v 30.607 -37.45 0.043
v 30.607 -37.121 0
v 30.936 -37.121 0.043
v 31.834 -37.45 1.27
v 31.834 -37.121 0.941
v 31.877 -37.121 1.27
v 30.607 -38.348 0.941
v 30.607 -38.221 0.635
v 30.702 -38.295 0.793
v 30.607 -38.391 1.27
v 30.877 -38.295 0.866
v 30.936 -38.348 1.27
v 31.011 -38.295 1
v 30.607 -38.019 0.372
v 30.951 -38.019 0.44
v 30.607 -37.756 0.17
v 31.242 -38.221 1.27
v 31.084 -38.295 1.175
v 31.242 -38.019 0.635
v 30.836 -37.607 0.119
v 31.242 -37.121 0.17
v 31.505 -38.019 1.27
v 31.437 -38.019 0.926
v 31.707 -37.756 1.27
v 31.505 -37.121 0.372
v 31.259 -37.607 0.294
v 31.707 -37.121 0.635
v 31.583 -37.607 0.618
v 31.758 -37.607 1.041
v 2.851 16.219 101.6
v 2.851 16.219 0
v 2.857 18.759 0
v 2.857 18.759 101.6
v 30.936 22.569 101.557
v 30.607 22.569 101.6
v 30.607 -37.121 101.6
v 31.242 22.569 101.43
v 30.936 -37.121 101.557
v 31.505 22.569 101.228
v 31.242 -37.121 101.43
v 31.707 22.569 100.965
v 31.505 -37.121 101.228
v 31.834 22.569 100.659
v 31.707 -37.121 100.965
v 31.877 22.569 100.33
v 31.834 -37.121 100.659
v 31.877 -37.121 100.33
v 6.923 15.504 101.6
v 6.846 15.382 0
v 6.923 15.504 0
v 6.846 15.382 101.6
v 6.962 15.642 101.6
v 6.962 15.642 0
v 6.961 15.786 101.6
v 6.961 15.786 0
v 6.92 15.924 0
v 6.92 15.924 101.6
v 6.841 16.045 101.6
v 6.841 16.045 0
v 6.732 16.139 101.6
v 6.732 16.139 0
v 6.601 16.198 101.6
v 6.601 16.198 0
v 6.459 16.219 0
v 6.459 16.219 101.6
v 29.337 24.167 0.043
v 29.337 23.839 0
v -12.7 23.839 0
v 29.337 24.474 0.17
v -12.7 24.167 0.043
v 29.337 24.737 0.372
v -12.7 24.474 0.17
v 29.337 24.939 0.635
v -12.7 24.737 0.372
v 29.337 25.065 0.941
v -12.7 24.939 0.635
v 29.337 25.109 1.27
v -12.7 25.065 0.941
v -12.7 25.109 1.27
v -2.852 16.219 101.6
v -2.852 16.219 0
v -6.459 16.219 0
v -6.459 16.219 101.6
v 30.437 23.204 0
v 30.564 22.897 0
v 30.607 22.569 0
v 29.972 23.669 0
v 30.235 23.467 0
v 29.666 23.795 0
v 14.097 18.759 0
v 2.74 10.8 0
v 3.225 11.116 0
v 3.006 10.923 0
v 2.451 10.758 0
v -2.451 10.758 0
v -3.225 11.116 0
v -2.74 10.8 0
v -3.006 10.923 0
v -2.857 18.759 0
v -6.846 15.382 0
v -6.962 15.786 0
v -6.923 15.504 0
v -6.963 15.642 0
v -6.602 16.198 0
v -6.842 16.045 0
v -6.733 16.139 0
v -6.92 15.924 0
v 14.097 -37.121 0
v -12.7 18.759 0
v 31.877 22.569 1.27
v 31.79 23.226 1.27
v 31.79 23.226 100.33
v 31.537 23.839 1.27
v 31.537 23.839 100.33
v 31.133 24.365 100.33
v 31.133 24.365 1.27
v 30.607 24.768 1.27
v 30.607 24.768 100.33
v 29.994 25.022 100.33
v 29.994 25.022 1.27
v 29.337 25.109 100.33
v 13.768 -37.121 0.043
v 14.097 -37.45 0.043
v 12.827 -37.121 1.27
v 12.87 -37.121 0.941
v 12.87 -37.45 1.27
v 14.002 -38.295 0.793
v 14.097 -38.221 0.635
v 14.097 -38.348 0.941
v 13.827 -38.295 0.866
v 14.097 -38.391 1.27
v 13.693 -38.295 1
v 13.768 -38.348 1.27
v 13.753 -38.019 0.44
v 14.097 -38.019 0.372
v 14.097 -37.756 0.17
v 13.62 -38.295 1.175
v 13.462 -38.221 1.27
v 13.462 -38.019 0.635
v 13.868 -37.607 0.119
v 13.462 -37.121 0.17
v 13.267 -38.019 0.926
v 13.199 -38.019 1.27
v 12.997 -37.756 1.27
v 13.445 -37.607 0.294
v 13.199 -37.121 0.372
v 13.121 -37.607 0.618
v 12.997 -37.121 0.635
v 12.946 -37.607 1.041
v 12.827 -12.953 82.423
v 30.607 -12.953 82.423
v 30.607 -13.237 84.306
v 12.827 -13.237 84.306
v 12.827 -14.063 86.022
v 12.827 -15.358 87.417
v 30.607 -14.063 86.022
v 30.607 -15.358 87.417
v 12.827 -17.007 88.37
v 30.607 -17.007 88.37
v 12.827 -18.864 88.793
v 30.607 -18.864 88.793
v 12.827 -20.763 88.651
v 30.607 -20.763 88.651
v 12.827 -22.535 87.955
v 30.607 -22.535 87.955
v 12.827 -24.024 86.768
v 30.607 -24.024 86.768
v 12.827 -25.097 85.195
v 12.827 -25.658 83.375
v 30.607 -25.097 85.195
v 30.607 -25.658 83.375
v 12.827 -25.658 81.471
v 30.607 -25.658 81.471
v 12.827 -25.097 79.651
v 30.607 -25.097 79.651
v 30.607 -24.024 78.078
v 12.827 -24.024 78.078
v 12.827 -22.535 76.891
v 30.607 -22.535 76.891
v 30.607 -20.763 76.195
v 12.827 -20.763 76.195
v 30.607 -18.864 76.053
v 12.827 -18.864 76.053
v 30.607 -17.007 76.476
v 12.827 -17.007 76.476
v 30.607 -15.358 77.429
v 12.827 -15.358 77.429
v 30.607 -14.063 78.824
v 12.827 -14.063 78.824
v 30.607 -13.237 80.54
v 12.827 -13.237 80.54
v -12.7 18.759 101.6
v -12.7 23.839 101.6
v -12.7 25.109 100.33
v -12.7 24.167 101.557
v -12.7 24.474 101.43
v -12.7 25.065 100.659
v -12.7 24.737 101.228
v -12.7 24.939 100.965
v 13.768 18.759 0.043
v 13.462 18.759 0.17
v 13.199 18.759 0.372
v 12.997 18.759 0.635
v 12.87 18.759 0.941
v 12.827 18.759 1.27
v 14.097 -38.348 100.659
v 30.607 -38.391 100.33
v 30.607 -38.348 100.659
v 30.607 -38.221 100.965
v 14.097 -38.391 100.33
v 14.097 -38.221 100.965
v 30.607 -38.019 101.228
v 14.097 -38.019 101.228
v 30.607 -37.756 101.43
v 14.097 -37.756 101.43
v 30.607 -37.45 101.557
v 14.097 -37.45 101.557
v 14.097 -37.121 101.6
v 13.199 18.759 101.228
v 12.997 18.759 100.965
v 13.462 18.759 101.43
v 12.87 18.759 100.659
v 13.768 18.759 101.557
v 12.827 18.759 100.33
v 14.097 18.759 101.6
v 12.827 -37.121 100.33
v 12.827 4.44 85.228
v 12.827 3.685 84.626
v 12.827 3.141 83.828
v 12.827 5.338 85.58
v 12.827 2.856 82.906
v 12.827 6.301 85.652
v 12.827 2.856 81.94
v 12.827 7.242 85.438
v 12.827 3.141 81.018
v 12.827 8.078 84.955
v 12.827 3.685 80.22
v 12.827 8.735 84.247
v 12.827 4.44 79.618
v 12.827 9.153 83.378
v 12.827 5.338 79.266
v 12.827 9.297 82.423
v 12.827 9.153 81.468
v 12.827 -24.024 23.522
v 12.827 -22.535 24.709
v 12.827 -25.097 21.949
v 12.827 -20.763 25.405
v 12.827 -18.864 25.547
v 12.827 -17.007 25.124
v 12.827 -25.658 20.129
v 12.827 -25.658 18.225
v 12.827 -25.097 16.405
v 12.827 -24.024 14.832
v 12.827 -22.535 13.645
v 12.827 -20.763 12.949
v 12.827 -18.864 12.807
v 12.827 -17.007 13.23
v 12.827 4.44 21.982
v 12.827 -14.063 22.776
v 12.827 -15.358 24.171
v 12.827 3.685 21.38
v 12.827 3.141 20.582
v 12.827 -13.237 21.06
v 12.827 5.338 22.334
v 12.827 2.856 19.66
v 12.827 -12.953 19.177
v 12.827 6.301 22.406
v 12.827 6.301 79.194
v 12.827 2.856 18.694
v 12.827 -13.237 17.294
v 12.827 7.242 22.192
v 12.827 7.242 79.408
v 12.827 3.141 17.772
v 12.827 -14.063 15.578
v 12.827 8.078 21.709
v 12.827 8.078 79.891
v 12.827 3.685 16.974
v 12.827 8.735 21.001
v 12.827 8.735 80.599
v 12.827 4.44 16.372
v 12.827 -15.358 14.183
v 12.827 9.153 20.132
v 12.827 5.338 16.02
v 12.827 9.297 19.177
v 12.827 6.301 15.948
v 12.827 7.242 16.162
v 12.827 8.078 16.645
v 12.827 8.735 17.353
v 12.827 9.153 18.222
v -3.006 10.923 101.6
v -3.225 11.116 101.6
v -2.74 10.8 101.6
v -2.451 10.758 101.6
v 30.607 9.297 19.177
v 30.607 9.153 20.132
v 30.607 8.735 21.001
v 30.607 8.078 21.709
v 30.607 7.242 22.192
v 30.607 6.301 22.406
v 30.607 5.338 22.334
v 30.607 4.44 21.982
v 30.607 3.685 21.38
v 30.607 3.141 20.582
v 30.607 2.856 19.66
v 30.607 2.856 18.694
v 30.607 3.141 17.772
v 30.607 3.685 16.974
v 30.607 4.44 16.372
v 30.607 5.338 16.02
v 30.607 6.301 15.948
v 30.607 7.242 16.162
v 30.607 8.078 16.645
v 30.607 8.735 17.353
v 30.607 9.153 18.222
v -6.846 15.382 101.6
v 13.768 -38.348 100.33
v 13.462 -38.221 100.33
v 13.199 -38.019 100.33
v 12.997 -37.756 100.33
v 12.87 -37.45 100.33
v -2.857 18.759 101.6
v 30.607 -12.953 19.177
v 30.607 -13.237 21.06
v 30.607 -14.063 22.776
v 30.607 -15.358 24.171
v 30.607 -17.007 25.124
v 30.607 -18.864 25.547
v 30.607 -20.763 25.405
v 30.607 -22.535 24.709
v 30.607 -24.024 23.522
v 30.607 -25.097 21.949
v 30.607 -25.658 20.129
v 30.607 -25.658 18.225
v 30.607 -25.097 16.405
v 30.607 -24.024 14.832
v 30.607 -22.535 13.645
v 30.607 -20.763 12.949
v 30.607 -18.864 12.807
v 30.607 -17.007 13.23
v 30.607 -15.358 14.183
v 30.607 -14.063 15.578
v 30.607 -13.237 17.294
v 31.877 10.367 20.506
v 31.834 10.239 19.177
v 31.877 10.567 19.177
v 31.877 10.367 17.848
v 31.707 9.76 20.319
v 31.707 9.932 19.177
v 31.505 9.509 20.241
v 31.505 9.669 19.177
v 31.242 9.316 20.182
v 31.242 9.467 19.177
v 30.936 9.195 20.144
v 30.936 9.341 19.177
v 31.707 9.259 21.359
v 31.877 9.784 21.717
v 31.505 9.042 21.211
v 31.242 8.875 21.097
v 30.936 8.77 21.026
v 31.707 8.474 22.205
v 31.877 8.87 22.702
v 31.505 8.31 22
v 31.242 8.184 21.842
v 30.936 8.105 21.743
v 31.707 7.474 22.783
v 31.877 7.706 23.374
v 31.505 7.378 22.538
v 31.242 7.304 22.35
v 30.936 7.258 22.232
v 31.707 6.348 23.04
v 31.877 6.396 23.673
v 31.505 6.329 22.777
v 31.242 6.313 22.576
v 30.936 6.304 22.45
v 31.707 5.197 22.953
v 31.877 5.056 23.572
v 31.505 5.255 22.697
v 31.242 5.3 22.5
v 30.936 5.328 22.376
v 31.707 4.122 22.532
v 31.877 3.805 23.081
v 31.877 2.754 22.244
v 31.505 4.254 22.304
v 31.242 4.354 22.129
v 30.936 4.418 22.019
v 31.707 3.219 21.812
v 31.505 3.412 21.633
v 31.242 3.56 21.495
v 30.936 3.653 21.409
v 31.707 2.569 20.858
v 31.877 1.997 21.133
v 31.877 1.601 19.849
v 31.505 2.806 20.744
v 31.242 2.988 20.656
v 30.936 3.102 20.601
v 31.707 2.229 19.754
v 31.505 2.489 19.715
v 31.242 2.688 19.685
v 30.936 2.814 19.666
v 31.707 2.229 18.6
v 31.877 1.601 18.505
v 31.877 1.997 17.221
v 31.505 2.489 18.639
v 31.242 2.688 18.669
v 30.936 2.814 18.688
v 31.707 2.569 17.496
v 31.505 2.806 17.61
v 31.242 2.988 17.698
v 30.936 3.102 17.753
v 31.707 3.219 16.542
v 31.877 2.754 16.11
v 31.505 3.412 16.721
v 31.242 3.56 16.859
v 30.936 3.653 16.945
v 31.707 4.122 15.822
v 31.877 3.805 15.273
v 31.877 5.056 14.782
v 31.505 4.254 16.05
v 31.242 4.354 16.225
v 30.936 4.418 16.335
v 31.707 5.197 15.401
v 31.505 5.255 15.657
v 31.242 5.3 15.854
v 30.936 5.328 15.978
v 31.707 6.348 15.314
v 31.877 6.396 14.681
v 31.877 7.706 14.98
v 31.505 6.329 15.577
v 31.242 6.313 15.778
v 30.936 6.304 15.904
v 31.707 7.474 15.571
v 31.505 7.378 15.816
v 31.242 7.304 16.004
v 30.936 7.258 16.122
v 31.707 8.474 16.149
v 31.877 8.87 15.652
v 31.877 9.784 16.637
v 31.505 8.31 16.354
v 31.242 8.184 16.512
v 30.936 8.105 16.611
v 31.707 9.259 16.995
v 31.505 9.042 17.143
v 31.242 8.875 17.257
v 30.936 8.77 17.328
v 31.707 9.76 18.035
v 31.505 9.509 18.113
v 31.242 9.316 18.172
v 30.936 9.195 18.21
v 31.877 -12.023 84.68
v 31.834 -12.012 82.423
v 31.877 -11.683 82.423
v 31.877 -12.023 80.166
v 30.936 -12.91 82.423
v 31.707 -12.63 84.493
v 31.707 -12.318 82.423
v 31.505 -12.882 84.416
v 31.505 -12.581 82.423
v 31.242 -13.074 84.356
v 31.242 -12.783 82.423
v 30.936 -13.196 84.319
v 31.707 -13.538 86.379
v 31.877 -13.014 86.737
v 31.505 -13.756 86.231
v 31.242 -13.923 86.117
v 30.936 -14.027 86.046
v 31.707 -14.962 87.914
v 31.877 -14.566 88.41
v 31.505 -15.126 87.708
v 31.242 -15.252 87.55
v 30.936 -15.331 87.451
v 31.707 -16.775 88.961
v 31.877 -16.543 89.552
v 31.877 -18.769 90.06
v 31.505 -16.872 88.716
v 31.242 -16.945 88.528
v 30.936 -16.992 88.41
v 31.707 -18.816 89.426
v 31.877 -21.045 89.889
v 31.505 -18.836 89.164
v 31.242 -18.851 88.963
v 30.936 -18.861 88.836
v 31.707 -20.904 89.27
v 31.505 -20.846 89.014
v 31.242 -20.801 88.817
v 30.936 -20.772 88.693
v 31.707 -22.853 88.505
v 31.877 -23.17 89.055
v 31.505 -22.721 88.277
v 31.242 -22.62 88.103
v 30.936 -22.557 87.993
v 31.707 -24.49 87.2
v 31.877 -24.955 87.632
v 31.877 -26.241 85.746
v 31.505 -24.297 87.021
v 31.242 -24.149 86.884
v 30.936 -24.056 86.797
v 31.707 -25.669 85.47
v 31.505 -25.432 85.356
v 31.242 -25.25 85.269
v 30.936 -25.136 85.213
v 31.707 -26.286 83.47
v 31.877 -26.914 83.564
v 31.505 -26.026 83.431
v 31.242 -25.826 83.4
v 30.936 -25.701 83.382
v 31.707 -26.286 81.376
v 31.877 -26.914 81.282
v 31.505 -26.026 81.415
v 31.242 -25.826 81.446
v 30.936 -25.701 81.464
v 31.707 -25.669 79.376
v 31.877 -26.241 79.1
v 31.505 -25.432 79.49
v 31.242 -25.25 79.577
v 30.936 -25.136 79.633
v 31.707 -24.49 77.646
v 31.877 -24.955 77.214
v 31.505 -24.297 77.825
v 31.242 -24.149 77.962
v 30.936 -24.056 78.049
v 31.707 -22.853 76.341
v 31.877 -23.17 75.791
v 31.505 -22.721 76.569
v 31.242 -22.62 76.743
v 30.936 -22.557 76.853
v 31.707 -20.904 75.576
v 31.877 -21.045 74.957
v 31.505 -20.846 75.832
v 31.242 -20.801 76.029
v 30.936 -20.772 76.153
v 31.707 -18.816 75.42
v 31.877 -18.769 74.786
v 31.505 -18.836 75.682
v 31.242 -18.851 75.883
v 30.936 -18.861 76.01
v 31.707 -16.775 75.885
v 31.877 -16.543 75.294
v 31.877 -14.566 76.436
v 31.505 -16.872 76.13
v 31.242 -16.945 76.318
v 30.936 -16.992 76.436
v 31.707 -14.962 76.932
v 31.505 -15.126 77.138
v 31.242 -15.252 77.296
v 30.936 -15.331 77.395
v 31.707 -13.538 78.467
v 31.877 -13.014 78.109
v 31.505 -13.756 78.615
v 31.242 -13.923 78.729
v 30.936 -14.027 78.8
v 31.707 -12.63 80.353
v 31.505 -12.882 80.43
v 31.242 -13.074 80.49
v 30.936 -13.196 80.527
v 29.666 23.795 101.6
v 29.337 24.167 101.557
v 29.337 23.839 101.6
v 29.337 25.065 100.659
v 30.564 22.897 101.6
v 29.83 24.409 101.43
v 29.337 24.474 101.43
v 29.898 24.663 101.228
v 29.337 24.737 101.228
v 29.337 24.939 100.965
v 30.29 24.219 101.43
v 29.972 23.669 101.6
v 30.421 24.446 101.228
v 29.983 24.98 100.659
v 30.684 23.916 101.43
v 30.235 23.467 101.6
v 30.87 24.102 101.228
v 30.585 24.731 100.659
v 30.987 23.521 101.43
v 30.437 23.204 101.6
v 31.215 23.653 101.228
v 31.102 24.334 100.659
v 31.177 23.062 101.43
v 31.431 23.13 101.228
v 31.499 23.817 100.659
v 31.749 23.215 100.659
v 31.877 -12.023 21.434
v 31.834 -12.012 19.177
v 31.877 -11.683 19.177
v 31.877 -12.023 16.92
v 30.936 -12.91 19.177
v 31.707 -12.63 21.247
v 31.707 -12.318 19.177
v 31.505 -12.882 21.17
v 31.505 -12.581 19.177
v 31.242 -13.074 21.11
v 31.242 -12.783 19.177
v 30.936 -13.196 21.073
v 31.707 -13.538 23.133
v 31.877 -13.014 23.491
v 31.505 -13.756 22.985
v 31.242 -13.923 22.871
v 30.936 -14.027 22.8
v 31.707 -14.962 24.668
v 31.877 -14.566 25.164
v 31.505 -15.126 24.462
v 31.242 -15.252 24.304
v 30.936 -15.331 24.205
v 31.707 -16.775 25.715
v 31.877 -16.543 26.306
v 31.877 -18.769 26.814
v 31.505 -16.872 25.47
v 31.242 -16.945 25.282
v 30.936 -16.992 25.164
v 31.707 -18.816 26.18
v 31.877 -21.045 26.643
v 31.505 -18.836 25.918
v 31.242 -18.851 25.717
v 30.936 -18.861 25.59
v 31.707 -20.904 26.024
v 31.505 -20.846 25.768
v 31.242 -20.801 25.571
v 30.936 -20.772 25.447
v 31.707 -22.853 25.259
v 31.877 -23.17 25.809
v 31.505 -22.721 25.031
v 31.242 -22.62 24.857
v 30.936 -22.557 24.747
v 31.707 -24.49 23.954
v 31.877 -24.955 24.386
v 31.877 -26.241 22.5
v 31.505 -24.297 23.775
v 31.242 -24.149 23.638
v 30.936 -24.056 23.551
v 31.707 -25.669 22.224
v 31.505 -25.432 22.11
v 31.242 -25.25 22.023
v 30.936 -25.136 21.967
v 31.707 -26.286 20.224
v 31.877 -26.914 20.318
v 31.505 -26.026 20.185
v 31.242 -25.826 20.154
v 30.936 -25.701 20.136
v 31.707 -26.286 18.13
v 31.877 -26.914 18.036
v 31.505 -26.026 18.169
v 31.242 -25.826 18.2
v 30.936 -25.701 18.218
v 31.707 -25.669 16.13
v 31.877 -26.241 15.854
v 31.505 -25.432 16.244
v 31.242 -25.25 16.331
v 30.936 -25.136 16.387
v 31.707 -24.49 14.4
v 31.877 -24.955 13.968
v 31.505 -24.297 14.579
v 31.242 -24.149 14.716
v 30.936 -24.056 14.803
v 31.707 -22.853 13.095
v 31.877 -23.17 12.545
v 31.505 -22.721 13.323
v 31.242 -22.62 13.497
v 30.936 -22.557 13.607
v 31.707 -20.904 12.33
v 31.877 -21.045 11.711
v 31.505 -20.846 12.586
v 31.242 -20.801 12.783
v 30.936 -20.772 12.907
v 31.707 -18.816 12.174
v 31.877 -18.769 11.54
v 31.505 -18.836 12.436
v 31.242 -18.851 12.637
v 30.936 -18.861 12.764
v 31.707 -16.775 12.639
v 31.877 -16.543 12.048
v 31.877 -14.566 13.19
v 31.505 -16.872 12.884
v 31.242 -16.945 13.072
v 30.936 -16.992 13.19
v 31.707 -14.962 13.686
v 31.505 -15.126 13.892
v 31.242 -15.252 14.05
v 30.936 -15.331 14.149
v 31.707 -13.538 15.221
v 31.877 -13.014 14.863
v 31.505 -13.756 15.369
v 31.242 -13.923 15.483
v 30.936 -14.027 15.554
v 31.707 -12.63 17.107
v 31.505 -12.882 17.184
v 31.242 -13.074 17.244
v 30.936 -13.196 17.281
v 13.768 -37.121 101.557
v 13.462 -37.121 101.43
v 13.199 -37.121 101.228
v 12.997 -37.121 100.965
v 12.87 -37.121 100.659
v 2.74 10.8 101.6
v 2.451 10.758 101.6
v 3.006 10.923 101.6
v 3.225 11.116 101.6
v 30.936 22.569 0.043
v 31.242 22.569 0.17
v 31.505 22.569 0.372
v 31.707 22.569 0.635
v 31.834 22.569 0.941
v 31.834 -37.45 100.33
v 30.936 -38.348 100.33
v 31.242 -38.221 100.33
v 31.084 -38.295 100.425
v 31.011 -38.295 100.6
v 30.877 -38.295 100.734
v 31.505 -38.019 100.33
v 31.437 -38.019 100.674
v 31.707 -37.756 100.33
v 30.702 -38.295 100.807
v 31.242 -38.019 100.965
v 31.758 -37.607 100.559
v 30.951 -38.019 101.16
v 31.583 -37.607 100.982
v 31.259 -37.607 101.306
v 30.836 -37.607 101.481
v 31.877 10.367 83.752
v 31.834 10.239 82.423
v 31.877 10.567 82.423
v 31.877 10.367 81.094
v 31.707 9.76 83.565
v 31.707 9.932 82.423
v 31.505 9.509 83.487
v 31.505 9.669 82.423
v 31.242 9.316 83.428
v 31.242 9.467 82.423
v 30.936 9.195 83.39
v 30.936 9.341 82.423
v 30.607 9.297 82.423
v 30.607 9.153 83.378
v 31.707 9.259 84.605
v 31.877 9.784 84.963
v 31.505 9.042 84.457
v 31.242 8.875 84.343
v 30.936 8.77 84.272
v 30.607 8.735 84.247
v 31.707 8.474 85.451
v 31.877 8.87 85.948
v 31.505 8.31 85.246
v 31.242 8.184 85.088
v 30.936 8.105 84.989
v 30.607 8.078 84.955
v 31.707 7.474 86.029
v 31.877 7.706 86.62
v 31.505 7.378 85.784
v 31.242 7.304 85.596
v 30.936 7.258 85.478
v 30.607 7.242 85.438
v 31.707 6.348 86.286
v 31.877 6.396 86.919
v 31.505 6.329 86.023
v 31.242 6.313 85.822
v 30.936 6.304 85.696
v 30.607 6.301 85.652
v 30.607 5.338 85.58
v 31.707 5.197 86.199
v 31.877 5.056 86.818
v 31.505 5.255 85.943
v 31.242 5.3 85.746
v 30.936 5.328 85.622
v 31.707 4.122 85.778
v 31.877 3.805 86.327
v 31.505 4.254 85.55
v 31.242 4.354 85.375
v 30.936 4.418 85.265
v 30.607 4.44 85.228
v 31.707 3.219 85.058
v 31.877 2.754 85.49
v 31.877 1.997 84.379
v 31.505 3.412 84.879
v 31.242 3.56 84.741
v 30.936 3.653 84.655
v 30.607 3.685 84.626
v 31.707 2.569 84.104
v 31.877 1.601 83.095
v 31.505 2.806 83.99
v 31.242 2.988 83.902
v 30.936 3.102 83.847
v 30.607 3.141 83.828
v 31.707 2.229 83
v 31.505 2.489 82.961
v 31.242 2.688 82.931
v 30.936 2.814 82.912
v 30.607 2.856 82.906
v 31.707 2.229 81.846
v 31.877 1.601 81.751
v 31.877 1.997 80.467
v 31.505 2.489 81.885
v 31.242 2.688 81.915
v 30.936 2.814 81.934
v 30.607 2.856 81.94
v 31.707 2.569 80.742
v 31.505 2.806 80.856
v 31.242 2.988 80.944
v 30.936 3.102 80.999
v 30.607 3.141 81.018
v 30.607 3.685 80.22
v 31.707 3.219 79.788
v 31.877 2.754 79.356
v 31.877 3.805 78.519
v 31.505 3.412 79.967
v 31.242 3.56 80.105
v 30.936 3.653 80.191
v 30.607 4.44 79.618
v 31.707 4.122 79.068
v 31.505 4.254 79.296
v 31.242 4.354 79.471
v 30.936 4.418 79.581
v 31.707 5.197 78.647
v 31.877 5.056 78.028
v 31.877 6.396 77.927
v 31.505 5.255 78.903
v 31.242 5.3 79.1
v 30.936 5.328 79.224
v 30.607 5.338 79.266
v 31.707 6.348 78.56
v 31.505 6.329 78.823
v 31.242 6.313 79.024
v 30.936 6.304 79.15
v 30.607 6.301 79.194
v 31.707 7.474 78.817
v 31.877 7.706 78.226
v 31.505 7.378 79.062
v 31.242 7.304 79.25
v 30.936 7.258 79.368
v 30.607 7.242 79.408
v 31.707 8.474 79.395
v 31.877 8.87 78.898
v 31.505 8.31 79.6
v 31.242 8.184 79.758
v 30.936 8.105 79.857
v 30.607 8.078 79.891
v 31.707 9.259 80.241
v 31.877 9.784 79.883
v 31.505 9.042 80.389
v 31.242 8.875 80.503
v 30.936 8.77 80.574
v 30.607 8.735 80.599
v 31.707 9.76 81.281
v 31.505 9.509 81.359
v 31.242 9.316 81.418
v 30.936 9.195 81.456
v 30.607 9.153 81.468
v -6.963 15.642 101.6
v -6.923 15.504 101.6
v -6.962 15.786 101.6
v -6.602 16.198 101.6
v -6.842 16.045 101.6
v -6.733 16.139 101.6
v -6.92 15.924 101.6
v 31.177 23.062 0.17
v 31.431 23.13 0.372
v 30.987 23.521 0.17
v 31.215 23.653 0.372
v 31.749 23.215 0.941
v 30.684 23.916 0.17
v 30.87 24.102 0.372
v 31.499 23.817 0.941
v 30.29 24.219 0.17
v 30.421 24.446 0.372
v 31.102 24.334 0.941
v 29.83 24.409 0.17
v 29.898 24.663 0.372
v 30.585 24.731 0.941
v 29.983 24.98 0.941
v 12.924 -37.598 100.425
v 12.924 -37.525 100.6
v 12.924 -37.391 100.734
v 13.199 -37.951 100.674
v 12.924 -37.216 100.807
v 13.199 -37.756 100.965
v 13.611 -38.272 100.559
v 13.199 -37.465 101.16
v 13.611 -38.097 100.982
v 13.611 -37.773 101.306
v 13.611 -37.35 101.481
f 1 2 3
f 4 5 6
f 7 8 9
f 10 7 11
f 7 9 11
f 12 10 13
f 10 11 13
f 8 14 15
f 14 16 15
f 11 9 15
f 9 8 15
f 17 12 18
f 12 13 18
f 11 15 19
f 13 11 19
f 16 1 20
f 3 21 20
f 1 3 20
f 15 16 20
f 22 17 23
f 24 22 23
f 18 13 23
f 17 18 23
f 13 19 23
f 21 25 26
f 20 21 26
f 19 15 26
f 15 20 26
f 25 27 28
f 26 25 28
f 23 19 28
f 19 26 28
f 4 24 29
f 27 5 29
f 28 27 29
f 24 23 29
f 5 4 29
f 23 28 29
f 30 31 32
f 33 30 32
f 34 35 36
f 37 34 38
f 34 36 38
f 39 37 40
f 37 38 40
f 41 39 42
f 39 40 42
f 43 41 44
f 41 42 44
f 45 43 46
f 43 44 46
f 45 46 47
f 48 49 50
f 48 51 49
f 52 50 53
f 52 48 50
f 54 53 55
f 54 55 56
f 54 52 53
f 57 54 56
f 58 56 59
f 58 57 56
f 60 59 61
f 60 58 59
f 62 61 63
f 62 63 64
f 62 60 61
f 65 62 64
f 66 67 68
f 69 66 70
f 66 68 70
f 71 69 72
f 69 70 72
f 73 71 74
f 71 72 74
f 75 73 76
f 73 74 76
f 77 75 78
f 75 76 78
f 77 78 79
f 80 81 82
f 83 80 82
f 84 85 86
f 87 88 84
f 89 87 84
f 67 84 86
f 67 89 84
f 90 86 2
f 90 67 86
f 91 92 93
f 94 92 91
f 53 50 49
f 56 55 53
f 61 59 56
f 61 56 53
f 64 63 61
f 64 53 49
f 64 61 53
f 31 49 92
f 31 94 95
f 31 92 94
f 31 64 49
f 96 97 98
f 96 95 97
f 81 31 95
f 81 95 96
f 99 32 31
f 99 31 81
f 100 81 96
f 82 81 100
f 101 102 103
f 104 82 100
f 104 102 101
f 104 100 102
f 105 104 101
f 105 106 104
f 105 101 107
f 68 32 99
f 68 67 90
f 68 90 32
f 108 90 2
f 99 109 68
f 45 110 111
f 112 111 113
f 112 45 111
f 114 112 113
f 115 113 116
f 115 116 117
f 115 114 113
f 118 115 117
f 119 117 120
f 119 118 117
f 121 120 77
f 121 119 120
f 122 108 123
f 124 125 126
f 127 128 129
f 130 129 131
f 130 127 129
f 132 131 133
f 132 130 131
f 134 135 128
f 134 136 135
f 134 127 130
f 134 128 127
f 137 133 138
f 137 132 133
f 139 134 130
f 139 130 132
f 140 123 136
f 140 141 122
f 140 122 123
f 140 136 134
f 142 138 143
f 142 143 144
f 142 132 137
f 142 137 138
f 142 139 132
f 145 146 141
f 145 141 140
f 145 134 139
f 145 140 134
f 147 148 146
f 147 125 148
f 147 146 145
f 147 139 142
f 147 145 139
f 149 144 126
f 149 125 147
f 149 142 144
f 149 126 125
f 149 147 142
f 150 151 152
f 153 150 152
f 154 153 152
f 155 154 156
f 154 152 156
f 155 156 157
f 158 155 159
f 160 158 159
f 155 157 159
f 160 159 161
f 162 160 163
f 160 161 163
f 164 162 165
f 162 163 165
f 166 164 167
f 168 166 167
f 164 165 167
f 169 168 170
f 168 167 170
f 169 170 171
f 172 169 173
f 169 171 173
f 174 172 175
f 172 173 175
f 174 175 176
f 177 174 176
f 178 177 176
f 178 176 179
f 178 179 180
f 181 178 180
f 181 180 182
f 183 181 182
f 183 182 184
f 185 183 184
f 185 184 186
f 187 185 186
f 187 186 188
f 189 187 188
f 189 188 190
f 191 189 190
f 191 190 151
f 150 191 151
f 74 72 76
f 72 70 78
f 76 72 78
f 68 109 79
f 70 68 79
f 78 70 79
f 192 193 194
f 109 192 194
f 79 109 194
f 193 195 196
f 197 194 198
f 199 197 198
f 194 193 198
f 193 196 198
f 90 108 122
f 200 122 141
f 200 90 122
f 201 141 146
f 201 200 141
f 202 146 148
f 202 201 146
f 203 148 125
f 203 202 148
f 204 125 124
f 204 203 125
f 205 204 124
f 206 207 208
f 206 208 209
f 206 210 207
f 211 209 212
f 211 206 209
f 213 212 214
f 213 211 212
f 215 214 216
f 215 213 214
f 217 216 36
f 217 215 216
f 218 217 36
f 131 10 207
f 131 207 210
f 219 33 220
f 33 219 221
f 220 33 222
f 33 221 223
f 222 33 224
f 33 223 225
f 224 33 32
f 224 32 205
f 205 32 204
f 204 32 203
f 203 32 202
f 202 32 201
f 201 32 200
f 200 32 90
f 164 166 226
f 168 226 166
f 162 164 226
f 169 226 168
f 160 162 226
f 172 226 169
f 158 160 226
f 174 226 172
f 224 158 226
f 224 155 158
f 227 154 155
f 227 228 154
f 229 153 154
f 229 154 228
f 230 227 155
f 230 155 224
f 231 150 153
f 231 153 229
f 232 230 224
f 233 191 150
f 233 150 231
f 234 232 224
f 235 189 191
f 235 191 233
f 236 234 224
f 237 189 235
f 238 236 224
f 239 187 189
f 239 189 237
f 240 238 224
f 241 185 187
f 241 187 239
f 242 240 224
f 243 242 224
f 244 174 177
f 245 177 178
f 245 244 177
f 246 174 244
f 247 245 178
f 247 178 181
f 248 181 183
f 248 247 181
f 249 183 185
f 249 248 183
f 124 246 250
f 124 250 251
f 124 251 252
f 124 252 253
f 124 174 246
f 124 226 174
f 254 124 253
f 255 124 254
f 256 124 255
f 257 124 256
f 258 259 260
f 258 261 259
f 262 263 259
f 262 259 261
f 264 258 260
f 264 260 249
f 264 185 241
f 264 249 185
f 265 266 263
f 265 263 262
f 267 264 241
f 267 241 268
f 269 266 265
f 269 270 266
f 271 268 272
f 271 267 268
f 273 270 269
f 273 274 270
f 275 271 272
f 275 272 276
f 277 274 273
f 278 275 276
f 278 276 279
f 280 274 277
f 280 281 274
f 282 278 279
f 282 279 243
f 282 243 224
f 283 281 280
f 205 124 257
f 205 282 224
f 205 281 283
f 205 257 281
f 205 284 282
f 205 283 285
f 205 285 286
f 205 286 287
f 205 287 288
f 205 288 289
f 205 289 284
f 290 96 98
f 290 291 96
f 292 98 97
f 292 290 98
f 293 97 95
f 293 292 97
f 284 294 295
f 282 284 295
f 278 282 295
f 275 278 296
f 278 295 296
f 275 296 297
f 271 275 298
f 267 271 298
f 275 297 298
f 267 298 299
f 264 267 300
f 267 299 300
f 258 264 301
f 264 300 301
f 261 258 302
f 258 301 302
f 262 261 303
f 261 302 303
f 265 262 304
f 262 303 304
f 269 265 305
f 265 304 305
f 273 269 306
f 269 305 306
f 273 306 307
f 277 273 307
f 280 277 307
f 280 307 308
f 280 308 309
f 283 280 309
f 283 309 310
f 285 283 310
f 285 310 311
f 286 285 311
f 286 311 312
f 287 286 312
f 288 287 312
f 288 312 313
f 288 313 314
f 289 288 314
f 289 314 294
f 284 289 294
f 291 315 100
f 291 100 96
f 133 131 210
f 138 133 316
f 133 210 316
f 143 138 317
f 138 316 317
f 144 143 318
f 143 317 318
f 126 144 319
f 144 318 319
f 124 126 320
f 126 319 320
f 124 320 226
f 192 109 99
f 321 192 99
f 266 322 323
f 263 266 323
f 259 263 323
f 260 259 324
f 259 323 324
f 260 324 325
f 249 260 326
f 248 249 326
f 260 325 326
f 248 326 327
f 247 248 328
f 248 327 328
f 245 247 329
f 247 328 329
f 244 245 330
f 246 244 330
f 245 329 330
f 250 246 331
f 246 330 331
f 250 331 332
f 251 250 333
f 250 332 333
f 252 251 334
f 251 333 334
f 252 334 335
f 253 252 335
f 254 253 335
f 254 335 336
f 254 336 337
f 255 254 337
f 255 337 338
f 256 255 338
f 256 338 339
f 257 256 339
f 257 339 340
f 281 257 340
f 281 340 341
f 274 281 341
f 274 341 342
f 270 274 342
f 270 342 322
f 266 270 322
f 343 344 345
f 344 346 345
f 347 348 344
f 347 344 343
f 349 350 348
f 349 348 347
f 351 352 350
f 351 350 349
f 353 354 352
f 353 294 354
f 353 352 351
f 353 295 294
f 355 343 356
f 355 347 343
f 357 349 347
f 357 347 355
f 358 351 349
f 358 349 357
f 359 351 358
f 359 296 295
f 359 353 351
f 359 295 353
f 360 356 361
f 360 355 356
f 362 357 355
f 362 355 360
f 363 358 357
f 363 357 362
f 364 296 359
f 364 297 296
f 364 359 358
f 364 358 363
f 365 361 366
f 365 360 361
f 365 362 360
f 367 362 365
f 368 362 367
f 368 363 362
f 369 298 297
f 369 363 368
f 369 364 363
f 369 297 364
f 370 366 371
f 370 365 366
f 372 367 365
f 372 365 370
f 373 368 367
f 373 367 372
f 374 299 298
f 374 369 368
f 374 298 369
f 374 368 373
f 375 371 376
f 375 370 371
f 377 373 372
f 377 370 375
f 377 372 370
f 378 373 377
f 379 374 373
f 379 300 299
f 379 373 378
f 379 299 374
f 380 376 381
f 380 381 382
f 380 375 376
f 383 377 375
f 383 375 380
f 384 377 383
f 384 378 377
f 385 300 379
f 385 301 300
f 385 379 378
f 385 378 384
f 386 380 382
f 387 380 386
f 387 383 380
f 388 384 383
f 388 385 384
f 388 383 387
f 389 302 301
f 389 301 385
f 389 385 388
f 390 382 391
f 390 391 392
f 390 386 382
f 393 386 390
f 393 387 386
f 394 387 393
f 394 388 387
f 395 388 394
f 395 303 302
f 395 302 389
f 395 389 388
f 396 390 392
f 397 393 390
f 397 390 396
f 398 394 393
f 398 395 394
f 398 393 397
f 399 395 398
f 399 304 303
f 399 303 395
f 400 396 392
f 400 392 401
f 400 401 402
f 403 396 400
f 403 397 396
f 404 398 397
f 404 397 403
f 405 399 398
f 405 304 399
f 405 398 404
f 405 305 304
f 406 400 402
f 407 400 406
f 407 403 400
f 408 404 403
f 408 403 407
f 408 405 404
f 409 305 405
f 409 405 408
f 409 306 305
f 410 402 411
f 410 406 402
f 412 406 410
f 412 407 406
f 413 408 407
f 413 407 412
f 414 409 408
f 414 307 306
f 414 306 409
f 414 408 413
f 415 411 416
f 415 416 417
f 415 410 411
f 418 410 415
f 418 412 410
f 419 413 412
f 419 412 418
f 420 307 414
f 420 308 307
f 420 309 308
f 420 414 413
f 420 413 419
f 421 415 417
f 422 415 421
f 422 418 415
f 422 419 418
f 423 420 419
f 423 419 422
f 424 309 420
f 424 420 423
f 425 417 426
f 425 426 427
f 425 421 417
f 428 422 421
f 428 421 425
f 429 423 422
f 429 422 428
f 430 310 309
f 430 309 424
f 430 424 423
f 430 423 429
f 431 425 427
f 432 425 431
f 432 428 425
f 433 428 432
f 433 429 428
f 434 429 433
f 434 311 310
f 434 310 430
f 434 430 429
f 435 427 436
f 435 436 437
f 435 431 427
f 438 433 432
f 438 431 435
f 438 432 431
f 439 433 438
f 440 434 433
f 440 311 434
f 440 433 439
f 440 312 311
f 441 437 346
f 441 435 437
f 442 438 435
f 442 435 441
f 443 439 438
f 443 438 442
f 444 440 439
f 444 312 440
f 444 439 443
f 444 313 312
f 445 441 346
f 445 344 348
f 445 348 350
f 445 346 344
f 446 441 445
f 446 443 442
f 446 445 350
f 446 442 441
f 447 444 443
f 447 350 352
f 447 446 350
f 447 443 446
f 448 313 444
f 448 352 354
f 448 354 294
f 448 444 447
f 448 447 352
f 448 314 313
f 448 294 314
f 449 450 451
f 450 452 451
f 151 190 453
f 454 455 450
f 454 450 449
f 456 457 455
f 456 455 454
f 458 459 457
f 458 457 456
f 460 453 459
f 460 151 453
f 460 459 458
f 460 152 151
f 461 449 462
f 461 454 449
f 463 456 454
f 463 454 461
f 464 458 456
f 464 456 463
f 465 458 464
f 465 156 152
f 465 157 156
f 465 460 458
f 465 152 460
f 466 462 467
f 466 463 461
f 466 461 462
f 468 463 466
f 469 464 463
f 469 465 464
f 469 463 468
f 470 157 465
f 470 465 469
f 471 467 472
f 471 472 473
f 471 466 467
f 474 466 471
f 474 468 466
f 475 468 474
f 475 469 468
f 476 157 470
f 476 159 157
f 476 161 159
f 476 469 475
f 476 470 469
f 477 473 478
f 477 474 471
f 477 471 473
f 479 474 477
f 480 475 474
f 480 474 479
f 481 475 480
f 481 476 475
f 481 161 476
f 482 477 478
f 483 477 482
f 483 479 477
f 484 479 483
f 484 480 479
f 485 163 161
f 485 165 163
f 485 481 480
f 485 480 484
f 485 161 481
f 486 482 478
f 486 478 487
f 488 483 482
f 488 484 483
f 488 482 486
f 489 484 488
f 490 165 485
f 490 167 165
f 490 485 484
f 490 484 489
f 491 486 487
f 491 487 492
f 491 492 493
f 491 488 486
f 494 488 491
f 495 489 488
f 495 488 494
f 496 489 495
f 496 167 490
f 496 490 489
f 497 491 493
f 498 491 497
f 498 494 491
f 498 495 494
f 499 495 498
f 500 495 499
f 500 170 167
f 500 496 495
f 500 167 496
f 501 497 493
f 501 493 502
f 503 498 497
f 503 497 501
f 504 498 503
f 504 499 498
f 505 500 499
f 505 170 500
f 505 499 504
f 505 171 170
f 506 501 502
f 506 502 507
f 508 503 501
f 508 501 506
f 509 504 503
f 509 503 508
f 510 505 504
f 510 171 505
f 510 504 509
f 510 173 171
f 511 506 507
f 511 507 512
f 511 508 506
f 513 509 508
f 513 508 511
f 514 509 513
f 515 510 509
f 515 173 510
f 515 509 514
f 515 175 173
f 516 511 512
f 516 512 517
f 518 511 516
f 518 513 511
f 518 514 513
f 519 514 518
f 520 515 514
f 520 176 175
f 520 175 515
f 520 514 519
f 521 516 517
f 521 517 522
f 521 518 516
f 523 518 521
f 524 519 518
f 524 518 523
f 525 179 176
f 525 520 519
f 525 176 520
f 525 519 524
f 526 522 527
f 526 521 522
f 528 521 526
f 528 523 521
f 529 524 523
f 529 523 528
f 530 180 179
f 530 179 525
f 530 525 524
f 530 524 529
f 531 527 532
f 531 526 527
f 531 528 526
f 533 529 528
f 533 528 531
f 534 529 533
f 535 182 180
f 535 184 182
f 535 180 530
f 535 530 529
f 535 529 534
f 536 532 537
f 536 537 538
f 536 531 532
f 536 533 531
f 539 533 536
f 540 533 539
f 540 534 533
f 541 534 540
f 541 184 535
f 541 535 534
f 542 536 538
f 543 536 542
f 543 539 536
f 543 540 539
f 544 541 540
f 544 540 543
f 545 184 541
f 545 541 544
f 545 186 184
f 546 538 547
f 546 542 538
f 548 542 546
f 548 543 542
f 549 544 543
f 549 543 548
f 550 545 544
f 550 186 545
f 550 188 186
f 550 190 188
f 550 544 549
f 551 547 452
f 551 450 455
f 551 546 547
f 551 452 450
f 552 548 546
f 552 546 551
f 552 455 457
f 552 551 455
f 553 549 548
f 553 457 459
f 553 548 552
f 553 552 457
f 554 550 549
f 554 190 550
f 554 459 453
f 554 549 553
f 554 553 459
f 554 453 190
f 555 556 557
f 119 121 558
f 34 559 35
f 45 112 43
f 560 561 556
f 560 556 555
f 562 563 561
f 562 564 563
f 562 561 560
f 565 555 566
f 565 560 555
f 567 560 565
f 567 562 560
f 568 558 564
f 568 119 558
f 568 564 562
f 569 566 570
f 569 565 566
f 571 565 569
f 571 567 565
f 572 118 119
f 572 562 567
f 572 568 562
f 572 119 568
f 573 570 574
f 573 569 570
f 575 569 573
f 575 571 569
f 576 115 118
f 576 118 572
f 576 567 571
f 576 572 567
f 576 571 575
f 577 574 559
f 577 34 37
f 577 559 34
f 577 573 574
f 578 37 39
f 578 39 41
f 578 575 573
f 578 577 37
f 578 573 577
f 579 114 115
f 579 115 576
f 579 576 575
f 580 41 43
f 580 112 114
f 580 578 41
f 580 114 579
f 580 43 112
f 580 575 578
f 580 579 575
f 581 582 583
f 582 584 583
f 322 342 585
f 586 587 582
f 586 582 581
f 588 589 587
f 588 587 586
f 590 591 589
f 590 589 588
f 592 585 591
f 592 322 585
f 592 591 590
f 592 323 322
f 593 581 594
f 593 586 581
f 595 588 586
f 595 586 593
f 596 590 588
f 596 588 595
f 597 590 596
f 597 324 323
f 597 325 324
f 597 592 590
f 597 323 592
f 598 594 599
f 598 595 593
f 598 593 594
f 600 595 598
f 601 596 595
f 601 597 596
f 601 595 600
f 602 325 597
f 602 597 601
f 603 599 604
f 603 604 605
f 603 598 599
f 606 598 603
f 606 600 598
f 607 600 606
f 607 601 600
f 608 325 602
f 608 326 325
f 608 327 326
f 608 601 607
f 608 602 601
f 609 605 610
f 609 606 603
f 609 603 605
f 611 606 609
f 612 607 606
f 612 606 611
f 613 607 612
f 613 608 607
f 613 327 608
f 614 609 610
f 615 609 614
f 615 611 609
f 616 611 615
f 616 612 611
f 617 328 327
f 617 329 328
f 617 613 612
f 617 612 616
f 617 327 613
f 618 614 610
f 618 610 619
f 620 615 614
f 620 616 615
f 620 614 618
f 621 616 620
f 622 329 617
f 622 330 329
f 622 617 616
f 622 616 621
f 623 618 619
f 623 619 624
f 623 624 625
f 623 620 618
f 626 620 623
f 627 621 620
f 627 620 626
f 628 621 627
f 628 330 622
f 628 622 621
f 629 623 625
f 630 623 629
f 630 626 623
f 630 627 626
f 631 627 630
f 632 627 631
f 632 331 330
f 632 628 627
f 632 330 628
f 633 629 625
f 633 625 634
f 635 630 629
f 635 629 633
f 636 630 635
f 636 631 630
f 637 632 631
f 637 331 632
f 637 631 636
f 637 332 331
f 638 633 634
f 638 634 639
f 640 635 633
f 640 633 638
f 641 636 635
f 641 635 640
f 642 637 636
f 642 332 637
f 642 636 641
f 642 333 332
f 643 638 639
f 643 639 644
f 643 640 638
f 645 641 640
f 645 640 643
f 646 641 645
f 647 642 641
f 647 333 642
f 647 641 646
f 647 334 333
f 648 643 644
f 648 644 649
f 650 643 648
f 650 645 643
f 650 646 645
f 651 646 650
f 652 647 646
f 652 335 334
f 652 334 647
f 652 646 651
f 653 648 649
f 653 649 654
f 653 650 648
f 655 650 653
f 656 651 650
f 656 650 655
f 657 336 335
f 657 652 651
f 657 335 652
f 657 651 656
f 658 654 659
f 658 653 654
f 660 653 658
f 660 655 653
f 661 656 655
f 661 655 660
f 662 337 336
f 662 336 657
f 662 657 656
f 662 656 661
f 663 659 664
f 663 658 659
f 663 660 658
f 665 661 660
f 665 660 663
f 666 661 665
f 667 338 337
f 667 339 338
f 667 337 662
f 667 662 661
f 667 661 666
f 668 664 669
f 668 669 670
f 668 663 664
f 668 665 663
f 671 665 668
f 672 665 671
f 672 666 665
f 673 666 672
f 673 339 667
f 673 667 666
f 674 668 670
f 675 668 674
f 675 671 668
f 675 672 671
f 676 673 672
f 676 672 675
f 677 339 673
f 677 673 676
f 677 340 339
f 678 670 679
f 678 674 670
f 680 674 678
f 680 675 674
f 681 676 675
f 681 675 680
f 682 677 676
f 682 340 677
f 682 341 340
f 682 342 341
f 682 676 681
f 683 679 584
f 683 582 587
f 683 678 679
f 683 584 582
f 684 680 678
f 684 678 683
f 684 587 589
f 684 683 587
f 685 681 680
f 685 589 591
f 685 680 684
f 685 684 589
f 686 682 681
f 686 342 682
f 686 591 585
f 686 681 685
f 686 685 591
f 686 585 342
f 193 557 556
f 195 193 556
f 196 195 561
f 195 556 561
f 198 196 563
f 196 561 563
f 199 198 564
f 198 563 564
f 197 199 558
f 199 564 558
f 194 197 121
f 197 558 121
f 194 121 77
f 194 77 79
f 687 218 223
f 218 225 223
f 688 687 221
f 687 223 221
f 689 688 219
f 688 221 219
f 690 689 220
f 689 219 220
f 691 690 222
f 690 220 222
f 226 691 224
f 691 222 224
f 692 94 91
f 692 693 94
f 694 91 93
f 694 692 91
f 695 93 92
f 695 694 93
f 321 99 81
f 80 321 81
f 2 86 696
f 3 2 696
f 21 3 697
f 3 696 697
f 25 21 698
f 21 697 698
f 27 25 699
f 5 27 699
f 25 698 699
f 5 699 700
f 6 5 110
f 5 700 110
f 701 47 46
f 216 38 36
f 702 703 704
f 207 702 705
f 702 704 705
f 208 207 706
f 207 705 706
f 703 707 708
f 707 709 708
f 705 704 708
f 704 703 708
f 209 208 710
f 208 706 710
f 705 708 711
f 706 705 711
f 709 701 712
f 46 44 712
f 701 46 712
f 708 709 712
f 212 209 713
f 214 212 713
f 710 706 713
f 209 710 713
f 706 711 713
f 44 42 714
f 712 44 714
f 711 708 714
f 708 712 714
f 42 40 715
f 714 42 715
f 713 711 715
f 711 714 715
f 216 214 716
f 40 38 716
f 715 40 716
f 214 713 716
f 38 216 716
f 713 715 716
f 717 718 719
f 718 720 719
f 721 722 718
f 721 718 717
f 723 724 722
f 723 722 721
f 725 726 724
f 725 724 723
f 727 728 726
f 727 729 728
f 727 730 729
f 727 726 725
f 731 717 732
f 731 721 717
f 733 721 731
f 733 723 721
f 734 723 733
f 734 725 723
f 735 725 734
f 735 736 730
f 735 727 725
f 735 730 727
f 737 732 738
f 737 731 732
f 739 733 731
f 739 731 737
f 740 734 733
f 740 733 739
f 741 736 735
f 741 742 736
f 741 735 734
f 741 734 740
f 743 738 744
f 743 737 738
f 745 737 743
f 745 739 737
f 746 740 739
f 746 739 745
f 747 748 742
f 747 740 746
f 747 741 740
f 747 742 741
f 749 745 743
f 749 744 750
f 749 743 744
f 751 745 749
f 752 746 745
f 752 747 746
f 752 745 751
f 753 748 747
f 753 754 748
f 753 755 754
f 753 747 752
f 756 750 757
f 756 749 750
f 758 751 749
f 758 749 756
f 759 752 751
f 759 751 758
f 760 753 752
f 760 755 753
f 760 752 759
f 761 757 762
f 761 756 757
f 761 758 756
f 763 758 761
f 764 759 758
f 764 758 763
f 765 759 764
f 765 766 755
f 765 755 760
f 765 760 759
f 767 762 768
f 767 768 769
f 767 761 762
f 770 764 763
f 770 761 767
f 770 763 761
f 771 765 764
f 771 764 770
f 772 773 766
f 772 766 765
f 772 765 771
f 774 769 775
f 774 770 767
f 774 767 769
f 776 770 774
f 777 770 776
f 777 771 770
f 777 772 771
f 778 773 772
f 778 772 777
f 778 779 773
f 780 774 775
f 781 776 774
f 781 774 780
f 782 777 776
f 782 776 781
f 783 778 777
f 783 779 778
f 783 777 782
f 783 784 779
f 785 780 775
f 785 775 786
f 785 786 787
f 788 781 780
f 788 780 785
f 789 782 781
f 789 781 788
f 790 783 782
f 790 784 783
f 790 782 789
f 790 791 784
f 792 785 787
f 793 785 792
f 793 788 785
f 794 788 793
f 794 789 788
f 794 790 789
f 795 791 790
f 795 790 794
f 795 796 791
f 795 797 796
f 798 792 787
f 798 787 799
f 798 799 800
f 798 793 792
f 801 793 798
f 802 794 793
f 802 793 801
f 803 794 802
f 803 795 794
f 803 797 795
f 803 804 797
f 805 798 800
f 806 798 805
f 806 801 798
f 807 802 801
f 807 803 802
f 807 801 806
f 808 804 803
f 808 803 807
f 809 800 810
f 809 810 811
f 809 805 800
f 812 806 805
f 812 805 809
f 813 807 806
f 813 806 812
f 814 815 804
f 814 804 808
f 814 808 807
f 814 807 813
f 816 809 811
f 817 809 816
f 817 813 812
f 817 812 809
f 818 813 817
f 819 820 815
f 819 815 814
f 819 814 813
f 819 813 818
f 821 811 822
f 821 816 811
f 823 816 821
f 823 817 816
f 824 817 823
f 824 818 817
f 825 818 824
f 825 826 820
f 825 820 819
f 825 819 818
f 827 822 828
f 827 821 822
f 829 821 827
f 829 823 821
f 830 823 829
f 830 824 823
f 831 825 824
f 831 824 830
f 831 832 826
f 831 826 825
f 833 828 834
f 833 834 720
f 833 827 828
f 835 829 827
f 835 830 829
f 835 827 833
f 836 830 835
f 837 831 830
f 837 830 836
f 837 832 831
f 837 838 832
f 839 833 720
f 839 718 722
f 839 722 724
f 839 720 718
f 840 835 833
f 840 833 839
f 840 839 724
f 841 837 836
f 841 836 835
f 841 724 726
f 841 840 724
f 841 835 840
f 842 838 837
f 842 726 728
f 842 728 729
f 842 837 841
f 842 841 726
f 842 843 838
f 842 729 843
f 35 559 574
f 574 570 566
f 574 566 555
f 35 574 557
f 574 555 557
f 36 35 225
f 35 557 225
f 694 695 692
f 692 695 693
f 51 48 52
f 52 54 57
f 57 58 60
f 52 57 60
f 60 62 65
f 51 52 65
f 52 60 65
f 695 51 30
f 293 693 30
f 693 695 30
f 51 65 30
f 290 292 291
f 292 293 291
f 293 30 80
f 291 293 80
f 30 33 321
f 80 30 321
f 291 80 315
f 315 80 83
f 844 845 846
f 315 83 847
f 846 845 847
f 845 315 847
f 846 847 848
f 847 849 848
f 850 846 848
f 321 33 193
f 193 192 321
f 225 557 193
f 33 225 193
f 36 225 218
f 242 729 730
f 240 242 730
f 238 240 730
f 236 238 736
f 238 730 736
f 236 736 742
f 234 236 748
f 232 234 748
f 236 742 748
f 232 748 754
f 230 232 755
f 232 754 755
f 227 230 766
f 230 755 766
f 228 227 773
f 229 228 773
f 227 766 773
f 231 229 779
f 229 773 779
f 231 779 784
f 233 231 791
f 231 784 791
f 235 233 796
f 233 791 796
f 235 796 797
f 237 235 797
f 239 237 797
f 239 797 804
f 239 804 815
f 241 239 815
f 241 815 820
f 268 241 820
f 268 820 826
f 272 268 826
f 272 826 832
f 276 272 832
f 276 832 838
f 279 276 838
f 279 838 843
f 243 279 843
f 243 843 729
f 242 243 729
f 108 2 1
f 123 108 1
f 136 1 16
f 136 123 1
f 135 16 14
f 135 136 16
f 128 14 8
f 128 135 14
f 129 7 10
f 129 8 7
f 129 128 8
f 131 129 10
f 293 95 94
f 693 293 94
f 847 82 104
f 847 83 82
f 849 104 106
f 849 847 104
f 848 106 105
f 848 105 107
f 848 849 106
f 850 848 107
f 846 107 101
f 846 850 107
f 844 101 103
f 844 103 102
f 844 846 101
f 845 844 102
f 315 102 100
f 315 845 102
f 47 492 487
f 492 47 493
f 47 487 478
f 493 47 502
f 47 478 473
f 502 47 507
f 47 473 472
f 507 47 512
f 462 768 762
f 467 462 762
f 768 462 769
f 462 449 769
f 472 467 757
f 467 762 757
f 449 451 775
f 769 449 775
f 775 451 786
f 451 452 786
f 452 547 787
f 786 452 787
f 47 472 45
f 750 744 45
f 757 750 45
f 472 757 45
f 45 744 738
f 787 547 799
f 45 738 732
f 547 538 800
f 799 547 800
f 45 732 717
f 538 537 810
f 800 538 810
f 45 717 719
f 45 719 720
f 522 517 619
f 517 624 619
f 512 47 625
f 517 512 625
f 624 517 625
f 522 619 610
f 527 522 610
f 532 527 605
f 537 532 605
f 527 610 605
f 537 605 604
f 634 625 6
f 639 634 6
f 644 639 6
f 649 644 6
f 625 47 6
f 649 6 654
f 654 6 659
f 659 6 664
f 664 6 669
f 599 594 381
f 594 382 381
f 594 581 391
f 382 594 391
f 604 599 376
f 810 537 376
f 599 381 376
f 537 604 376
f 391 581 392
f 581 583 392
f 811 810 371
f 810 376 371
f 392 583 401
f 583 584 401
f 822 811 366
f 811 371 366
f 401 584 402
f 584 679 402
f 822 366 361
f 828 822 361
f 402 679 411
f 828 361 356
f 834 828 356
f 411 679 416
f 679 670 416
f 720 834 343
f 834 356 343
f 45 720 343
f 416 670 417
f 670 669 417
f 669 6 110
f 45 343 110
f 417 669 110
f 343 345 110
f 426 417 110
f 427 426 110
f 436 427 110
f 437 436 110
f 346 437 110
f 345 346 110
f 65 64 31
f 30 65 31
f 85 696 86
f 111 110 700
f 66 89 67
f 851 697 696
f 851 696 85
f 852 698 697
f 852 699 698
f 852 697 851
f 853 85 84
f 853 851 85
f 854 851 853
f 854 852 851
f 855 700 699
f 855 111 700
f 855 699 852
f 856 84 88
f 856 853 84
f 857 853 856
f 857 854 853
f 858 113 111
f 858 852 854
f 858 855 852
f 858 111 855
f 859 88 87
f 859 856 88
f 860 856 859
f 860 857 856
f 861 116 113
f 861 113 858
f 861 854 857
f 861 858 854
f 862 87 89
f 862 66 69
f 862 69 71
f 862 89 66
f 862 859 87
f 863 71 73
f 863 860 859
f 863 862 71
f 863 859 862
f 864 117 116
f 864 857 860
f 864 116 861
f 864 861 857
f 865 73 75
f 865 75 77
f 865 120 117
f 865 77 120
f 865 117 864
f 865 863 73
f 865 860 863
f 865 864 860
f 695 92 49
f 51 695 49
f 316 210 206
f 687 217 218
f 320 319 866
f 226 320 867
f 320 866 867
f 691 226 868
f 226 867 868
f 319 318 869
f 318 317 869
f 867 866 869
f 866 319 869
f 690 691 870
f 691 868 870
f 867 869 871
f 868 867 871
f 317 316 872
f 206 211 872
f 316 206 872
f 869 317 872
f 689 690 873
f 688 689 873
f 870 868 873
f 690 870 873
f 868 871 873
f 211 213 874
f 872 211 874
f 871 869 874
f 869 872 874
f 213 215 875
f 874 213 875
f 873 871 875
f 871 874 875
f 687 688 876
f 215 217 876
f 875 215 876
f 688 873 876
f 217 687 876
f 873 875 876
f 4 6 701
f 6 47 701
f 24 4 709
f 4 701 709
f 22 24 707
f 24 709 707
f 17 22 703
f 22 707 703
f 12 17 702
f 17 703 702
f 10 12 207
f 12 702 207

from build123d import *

# Parameters (mm, degrees)
SKETCH1_W           = 25.654
SKETCH1_H           = 6.35
BOSS_EXTRUDE1_DEPTH = 101.6
FILLET1_R           = 0.508
FILLET2_R           = 1.016
SKETCH3_W           = 19.05
SKETCH3_H           = 63.5
BOSS_EXTRUDE3_DEPTH = 101.6
SKETCH4_R           = 6.3881
CUT_EXTRUDE1_DEPTH  = 25.4
FILLET3_R           = 2.54
FILLET4_R           = 1.27
FILLET5_R           = 1.27
CUT_EXTRUDE3_REACH  = 119.452
SKETCH5_R           = 3.2385
FILLET7_R           = 1.27
SKETCH6_W           = 0.127
SKETCH6_H           = 6.35
CUT_EXTRUDE4_DEPTH  = 114.192714866


with BuildPart() as part:
    # Sketch1 → Boss-Extrude1 (new body)
    with BuildSketch(Plane.XY):
        with Locations((0, 21.933756602)):
            Rectangle(SKETCH1_W, SKETCH1_H)
        Polygon((2.851307039, 16.218756602), (2.857235141, 18.758756602), (-2.856686021, 18.758756602), (-2.851856159, 16.218756602), (-7.55677456, 16.218756602), (-2.921, 10.757756602), (2.921, 10.757756602), (7.55622544, 16.218756602), align=None)
    extrude(amount=BOSS_EXTRUDE1_DEPTH)

    # Fillet1
    fillet1_edges = [part.edges().sort_by_distance(p)[0] for p in [
        (7.55622544, 16.218756602, 50.8),
        (-7.55677456, 16.218756602, 50.8),
    ]]
    fillet(fillet1_edges, radius=FILLET1_R)

    # Fillet2
    fillet2_edges = [part.edges().sort_by_distance(p)[0] for p in [
        (2.921, 10.757756602, 50.8),
        (-2.921, 10.757756602, 50.8),
    ]]
    fillet(fillet2_edges, radius=FILLET2_R)

    # Sketch3 → Boss-Extrude3 (add)
    with BuildSketch(Plane(origin=(0, 0, 0), x_dir=(-1, 0, 0), z_dir=(0, 0, -1))):
        with Locations((-22.352, -6.641243398)):
            Rectangle(SKETCH3_W, SKETCH3_H)
    extrude(amount=-BOSS_EXTRUDE3_DEPTH)

    # Sketch4 → Cut-Extrude1 (cut)
    with BuildSketch(Plane(origin=(31.877, 0, 0), x_dir=(0, 0, -1), z_dir=(1, 0, 0))):
        with Locations(Location((-19.177, -19.341243398, 0), (0, 0, 90))):
            Circle(SKETCH4_R)
        with Locations(Location((-82.423, -19.341243398, 0), (0, 0, 90))):
            Circle(SKETCH4_R)
    extrude(amount=-CUT_EXTRUDE1_DEPTH, mode=Mode.SUBTRACT)

    # Fillet3
    fillet3_edges = [part.edges().sort_by_distance(p)[0] for p in [
        (31.877, 25.108756602, 50.8),
    ]]
    fillet(fillet3_edges, radius=FILLET3_R)

    # Fillet4
    fillet4_edges = [part.edges().sort_by_distance(p)[0] for p in [
        (31.877, -25.729343398, 82.423),
        (31.877, -25.729343398, 19.177),
    ]]
    fillet(fillet4_edges, radius=FILLET4_R)

    # Fillet5
    fillet5_edges = [part.edges().sort_by_distance(p)[0] for p in [
        (8.255, 25.108756602, 0),
        (8.255, 25.108756602, 101.6),
        (12.827, -9.816243398, 0),
        (22.352, -38.391243398, 0),
        (31.877, -38.391243398, 50.8),
        (22.352, -38.391243398, 101.6),
        (12.827, -38.391243398, 50.8),
        (12.827, -9.816243398, 101.6),
        (31.877, -7.911243398, 0),
        (31.133051224, 24.364807826, 0),
        (31.877, -7.911243398, 101.6),
        (31.133051224, 24.364807826, 101.6),
    ]]
    fillet(fillet5_edges, radius=FILLET5_R)

    # Sketch5 → Cut-Extrude3 (cut, up to next)
    with BuildSketch(Plane(origin=(31.877, 0, 0), x_dir=(0, 0, -1), z_dir=(1, 0, 0)), mode=Mode.PRIVATE) as cut_extrude3_sk1:
        with Locations(Location((-82.423, 6.058756602, 0), (0, 0, 90))):
            Circle(SKETCH5_R)
    cut_extrude3_tool1 = extrude(cut_extrude3_sk1.sketch, amount=-CUT_EXTRUDE3_REACH, mode=Mode.PRIVATE) & part.part
    # Sketch5 → Cut-Extrude3 (cut, up to next)
    with BuildSketch(Plane(origin=(31.877, 0, 0), x_dir=(0, 0, -1), z_dir=(1, 0, 0)), mode=Mode.PRIVATE) as cut_extrude3_sk2:
        with Locations(Location((-19.177, 6.058756602, 0), (0, 0, 90))):
            Circle(SKETCH5_R)
    cut_extrude3_tool2 = extrude(cut_extrude3_sk2.sketch, amount=-CUT_EXTRUDE3_REACH, mode=Mode.PRIVATE) & part.part
    add(cut_extrude3_tool1.solids().sort_by_distance((31.877, 6.058757, 82.423))[0], mode=Mode.SUBTRACT)
    add(cut_extrude3_tool2.solids().sort_by_distance((31.877, 6.058757, 19.177))[0], mode=Mode.SUBTRACT)

    # Fillet7
    fillet7_edges = [part.edges().sort_by_distance(p)[0] for p in [
        (31.877, 2.820256602, 82.423),
        (31.877, 2.820256602, 19.177),
    ]]
    fillet(fillet7_edges, radius=FILLET7_R)

    # Sketch6 → Cut-Extrude4 (cut, through all)
    with BuildSketch(Plane.XY.offset(101.6)):
        with Locations((-12.7635, 21.933756602)):
            Rectangle(SKETCH6_W, SKETCH6_H)
    extrude(amount=-CUT_EXTRUDE4_DEPTH, mode=Mode.SUBTRACT)


solid = part.part
